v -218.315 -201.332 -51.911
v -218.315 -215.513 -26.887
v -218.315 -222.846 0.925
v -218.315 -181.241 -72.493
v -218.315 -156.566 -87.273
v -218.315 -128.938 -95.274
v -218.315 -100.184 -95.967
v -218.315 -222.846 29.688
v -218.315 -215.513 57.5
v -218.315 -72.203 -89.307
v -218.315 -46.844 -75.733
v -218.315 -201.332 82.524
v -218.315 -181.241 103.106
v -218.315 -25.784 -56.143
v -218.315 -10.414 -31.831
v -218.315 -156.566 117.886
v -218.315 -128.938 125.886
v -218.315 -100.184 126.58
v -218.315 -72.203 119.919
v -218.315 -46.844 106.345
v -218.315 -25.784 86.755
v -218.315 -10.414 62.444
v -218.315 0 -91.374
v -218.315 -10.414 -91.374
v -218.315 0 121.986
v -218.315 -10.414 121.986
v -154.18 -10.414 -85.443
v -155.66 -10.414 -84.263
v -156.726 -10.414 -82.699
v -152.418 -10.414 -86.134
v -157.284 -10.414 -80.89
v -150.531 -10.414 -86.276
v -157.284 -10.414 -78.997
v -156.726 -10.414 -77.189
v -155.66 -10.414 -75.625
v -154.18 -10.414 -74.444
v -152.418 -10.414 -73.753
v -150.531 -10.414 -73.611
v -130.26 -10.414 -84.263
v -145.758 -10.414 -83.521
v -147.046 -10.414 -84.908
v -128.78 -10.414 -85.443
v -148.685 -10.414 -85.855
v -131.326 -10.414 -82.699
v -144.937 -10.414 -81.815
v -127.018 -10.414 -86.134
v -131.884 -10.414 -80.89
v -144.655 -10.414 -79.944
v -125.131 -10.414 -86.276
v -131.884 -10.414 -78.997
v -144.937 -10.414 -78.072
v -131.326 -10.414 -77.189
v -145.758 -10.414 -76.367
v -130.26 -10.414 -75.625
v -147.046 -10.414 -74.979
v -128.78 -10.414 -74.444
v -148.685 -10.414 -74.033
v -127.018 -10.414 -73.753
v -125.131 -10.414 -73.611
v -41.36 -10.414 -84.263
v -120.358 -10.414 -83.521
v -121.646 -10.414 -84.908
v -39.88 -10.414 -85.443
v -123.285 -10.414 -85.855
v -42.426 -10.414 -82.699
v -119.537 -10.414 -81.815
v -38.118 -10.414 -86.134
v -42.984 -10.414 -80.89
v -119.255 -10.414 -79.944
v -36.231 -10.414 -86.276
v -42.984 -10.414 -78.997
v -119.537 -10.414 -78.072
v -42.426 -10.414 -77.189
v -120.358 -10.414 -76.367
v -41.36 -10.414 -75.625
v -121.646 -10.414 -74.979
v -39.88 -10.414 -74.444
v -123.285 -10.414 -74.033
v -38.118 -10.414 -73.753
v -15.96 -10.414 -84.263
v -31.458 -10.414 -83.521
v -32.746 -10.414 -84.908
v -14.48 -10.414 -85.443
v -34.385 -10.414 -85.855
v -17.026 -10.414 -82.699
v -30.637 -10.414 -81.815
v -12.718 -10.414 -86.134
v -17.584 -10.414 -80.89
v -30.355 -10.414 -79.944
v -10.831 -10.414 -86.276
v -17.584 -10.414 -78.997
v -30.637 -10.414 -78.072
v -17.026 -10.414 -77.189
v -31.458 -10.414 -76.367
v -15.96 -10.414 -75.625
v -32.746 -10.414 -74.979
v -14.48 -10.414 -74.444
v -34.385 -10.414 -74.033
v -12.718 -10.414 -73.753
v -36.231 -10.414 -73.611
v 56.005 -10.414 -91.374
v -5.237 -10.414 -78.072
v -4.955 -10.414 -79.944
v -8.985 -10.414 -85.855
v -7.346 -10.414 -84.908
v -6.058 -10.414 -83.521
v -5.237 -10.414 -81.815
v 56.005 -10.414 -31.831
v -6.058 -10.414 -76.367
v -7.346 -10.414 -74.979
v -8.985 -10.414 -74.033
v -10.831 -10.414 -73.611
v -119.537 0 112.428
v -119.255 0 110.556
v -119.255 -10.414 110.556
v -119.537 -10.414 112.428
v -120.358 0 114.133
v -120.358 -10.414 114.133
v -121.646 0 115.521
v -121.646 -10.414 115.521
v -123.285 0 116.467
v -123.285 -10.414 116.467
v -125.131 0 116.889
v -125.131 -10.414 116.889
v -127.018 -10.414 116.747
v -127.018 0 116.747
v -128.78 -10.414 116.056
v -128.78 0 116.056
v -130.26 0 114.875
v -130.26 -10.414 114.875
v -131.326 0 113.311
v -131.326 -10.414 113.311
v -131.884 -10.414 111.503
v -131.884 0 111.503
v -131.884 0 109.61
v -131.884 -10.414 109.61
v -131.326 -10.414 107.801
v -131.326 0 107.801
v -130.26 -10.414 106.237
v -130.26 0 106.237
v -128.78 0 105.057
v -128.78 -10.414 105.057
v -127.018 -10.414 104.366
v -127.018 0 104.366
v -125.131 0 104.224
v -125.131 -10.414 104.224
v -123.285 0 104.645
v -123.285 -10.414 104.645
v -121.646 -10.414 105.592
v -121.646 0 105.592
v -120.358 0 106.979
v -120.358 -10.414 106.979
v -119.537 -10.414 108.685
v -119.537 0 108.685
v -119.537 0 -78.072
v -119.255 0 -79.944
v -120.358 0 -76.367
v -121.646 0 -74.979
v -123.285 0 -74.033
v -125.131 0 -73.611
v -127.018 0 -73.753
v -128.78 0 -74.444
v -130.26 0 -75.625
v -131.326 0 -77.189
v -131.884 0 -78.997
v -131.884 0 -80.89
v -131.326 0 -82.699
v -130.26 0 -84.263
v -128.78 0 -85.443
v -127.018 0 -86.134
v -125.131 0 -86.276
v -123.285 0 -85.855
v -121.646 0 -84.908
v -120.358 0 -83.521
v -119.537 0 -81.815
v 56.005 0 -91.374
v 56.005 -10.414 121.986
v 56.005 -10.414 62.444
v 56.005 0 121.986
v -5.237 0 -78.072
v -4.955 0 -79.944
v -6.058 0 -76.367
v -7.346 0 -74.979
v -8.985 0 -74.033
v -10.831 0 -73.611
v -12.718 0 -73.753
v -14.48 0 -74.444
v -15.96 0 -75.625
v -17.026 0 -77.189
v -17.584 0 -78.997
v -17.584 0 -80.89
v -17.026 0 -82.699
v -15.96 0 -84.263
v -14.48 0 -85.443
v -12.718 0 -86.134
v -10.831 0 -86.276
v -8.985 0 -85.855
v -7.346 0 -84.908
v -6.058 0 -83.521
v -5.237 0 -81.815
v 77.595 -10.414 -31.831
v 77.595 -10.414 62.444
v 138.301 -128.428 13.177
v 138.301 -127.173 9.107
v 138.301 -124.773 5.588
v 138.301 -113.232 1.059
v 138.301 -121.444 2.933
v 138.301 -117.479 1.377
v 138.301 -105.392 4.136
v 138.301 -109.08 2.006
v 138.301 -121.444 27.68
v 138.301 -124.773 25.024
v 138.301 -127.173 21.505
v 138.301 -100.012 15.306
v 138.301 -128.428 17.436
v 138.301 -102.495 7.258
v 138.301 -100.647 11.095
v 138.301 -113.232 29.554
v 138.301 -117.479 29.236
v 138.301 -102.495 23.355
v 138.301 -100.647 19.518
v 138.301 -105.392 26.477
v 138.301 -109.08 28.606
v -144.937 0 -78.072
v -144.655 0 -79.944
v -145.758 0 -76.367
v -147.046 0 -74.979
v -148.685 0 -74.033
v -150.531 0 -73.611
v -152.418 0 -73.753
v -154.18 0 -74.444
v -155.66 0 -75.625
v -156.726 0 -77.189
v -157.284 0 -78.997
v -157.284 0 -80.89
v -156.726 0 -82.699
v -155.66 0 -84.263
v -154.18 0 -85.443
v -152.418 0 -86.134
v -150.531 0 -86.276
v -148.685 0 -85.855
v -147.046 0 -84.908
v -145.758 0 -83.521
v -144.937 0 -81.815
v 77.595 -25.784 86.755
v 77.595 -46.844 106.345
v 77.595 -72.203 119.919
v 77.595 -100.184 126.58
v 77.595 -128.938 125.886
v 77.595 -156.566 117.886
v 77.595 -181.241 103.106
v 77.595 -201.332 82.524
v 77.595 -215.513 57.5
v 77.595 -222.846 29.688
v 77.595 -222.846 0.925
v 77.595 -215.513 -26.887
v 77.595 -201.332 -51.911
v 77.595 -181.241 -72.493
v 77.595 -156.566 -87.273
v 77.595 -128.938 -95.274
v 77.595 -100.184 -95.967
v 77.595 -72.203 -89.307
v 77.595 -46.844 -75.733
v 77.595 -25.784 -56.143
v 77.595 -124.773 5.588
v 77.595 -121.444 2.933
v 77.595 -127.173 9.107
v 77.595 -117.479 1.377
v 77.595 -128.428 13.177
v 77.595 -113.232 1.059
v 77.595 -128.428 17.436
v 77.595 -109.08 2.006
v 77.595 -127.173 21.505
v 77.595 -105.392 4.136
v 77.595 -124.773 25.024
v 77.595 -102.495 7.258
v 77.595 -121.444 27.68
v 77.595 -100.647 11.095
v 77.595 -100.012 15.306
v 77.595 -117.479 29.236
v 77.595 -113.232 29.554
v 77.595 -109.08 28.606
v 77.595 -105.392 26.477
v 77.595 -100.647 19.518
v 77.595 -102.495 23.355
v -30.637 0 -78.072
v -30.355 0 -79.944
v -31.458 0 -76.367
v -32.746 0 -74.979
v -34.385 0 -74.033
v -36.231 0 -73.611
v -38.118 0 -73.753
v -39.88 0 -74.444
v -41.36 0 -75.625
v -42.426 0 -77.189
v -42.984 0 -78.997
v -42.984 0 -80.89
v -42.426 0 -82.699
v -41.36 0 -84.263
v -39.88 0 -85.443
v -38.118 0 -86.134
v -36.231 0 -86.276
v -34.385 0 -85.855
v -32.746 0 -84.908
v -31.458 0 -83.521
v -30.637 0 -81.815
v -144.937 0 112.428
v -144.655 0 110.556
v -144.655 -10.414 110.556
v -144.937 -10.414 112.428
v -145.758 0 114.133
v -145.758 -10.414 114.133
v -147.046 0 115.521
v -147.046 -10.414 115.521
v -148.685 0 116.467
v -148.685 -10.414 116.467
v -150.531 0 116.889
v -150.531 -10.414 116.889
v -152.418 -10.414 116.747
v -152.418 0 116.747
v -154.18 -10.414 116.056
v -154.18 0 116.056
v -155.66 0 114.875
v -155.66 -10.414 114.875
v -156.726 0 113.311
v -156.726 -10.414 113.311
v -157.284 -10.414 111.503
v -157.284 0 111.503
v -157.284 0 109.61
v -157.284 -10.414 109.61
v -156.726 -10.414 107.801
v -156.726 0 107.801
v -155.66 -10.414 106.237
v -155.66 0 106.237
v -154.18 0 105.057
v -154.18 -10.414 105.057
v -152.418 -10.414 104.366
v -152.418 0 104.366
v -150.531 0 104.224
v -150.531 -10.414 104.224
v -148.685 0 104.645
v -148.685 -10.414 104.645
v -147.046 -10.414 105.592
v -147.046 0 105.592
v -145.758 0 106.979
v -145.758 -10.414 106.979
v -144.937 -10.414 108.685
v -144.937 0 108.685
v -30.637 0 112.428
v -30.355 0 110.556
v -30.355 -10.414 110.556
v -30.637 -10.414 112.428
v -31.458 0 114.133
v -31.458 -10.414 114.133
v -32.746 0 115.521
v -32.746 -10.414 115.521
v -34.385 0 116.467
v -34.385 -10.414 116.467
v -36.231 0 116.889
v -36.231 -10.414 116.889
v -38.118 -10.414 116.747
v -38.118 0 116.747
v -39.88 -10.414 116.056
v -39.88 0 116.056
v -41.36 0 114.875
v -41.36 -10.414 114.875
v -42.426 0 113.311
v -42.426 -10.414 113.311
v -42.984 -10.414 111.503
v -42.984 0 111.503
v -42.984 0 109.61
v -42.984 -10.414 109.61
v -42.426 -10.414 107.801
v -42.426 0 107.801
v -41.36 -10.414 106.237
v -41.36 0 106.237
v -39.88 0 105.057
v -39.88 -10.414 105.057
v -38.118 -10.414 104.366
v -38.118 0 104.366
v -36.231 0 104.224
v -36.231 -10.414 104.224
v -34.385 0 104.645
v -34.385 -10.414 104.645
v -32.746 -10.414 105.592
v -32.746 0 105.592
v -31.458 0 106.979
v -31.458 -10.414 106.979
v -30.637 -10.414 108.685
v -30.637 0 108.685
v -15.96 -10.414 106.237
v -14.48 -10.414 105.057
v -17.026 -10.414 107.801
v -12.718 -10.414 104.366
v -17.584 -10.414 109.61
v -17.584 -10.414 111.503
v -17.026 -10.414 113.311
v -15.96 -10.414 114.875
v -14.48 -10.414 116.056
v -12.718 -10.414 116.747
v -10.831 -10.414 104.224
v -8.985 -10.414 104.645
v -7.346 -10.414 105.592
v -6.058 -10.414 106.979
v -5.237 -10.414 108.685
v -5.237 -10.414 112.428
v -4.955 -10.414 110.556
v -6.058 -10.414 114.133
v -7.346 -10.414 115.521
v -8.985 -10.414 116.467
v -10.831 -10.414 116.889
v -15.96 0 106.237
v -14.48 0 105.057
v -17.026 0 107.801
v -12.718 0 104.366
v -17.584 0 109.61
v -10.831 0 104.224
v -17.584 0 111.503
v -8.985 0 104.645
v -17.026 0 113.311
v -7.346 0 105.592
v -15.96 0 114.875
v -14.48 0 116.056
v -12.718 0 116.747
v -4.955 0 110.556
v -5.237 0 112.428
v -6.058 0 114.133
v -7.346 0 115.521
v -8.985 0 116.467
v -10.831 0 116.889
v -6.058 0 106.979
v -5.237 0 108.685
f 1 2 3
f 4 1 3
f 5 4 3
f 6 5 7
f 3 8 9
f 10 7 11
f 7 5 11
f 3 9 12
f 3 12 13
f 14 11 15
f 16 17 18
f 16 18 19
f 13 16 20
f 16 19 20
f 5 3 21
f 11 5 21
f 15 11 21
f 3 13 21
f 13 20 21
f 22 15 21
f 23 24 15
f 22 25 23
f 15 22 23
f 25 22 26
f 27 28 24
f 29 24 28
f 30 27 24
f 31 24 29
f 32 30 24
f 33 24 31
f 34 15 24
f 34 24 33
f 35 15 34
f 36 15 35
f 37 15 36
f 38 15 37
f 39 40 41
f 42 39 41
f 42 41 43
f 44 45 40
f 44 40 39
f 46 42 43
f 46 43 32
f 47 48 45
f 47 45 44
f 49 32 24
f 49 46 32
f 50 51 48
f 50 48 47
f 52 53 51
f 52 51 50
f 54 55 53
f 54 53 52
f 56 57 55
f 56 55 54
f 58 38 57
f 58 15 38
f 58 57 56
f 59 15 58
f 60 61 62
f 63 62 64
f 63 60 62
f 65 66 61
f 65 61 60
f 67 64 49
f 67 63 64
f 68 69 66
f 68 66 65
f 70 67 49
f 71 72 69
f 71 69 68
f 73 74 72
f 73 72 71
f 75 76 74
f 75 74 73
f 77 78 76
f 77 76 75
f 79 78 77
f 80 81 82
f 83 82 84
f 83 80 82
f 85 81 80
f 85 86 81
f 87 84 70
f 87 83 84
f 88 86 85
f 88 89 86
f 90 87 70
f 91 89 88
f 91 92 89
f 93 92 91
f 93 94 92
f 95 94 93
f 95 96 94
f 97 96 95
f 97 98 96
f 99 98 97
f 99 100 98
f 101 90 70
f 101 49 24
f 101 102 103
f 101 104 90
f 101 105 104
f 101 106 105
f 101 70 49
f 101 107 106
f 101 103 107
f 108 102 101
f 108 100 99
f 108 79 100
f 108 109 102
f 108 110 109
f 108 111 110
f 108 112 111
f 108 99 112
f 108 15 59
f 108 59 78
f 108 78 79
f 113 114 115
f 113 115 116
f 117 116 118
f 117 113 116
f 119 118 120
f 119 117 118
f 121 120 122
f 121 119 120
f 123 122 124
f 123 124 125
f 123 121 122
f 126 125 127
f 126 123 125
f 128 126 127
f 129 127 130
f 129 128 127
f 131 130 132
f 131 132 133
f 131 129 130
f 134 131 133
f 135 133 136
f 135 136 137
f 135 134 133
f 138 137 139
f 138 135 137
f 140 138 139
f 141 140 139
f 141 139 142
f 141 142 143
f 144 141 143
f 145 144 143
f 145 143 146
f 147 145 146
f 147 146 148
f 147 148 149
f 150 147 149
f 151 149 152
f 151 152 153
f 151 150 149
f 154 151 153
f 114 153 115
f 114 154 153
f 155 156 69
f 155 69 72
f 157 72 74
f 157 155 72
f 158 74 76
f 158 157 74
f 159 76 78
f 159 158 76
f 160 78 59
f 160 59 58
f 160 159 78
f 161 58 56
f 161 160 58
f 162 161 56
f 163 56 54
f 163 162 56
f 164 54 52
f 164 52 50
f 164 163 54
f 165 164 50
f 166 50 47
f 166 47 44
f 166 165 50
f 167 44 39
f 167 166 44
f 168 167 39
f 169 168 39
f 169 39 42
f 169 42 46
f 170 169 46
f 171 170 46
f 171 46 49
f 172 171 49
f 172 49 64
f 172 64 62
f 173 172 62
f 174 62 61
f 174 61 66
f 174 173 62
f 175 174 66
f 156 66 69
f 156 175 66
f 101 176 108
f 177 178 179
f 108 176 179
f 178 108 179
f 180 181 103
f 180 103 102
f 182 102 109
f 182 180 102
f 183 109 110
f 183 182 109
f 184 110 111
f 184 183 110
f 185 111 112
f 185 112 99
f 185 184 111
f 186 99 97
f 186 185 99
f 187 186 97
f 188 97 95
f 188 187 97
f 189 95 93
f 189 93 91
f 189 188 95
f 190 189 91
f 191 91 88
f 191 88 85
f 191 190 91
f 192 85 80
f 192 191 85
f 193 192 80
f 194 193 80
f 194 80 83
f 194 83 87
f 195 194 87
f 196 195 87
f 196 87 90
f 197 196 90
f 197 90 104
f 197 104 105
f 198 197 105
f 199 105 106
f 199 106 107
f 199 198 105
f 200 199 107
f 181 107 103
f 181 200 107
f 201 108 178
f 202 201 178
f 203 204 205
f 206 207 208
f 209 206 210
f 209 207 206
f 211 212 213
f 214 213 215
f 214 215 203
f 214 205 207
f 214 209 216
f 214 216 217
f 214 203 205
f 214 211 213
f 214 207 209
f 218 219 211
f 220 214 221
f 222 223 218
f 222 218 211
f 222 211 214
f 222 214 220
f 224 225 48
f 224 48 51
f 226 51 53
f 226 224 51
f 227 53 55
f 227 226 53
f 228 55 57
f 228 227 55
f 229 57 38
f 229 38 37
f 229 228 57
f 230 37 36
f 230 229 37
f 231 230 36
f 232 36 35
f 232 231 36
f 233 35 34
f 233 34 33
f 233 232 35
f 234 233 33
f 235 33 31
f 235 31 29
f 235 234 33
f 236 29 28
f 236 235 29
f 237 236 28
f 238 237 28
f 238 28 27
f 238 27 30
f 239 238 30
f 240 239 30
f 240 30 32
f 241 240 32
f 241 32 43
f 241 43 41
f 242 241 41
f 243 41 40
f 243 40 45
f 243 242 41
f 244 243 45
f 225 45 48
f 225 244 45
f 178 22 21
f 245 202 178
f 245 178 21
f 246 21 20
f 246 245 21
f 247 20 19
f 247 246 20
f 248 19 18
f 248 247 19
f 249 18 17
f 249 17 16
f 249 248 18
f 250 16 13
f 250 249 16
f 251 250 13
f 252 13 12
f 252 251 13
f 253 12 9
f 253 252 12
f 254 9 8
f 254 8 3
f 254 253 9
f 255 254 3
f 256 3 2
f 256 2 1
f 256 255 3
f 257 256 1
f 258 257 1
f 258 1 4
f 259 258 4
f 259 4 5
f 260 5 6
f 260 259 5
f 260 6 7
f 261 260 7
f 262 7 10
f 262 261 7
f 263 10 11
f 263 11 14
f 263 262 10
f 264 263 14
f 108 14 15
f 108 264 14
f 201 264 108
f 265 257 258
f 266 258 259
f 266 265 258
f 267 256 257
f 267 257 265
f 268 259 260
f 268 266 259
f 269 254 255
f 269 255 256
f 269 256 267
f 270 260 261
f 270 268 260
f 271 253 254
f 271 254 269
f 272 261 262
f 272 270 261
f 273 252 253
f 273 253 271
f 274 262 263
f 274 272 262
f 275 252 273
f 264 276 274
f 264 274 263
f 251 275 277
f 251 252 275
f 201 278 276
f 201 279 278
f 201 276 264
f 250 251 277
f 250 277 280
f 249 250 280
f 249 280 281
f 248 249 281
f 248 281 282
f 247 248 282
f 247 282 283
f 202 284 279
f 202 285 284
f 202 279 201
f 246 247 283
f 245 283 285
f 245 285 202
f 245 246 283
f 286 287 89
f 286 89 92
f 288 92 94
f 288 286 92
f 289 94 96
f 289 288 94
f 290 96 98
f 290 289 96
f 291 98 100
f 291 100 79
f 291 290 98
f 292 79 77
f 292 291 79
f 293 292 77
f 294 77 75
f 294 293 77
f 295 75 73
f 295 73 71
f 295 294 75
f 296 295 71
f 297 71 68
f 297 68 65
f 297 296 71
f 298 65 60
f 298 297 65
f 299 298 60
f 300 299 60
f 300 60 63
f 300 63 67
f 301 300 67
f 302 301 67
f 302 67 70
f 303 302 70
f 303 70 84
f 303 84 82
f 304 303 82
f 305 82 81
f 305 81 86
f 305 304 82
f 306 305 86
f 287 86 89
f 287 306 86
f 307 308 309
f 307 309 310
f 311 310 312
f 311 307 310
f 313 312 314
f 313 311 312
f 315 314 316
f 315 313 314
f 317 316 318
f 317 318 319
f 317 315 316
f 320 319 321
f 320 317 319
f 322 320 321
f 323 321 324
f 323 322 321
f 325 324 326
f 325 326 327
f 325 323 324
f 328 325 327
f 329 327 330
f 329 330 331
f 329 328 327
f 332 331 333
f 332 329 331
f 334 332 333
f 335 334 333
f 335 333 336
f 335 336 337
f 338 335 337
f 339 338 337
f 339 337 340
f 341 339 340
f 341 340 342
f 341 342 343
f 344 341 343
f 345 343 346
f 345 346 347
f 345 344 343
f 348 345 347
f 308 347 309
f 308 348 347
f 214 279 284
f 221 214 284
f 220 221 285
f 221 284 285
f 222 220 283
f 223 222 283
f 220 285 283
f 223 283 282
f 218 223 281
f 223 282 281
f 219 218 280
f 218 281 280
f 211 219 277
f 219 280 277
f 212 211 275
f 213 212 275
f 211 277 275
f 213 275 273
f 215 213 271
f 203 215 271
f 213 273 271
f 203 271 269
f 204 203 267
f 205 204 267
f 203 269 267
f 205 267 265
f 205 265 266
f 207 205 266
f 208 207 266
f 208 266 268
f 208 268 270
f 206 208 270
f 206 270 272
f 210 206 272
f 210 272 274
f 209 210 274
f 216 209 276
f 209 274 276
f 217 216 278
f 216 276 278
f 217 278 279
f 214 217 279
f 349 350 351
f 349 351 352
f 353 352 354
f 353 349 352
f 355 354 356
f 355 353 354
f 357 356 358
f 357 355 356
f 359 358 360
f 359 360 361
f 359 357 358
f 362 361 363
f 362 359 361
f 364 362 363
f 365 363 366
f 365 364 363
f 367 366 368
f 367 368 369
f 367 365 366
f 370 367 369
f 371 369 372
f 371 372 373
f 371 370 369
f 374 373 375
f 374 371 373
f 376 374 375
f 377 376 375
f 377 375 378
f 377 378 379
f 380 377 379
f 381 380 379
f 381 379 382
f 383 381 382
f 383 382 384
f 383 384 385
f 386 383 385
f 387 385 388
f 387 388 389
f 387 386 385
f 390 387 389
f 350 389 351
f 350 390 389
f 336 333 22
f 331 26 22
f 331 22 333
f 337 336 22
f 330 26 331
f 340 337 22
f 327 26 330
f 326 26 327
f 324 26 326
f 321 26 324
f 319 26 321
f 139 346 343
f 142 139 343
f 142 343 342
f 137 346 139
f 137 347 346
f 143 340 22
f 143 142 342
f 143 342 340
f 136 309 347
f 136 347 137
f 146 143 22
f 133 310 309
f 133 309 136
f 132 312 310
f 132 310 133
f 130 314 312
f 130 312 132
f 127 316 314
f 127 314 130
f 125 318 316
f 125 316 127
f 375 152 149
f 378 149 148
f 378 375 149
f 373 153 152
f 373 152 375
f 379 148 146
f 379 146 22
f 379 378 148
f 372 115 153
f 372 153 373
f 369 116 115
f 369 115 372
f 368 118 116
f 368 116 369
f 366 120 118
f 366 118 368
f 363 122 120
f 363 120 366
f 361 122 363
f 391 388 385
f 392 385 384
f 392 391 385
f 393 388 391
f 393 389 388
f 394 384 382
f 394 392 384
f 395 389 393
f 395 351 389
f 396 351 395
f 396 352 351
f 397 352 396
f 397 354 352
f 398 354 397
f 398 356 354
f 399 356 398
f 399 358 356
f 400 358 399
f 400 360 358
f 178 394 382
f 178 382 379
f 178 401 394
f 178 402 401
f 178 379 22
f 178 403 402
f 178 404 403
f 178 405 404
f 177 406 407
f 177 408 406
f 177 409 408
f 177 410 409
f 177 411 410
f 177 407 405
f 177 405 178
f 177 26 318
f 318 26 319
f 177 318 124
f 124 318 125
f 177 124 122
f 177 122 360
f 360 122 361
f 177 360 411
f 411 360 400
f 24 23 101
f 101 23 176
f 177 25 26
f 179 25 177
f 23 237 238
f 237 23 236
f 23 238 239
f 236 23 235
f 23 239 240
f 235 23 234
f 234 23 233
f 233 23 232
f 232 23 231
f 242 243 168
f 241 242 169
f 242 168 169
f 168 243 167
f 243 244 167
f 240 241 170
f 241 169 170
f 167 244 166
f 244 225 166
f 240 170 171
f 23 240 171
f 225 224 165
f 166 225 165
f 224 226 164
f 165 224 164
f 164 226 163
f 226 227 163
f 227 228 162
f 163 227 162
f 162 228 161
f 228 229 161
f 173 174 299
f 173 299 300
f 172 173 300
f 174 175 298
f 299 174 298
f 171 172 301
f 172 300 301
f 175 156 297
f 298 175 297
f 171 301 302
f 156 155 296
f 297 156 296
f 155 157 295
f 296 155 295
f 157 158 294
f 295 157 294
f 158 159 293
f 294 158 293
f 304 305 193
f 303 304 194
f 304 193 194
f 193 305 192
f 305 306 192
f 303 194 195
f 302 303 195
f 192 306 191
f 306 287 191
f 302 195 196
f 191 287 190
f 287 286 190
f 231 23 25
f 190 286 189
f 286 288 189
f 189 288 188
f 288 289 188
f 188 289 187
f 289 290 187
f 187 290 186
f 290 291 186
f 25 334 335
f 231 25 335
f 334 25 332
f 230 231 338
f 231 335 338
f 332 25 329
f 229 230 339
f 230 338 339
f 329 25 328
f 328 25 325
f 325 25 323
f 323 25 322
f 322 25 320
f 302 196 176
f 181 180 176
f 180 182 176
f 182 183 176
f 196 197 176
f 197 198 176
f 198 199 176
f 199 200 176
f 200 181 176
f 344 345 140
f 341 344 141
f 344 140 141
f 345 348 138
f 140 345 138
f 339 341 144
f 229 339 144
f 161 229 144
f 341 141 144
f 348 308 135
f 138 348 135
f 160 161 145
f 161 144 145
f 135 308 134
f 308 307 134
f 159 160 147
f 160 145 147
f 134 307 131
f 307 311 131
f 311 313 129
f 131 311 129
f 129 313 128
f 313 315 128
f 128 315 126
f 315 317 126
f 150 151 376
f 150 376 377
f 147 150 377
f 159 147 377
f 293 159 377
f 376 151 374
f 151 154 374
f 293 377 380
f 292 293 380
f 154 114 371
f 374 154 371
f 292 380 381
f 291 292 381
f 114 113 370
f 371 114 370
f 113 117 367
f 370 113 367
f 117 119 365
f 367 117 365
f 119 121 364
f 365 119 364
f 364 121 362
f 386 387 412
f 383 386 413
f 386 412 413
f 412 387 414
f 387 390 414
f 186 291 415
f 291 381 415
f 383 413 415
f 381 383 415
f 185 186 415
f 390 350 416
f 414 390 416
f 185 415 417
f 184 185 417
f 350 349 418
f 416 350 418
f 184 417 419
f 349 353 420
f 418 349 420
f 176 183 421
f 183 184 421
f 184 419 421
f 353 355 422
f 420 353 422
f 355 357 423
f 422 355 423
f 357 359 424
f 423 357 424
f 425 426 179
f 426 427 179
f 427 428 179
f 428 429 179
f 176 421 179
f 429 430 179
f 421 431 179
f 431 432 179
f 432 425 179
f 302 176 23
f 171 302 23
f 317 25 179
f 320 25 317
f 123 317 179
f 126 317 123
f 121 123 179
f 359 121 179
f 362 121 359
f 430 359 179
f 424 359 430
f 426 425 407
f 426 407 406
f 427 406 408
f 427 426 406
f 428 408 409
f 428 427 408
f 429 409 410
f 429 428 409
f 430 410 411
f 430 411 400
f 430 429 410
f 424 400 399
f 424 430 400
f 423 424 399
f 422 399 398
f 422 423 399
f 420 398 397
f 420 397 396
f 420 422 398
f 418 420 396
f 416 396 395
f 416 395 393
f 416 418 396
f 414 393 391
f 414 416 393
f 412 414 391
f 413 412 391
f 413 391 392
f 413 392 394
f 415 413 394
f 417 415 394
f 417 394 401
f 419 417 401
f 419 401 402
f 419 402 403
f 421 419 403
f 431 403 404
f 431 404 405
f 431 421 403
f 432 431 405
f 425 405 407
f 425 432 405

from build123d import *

# Parameters (mm, degrees)
F0_W          = 274.32
F0_H          = 213.36
F0_R          = 6.35
F1_DEPTH      = 10.414
F3_DEPTH      = 21.59
F3_DEPTH_BACK = 274.32
F4_R          = 14.2875
F5_DEPTH      = 60.706


with BuildPart() as f1:
    # F0 (on Front) → F1 (new body)
    with BuildSketch(Plane.XZ):
        with Locations((-81.1550752527, 15.3063097969)):
            Rectangle(F0_W, F0_H)
        with Locations((-151.0050752527, -79.9436902031)):
            Circle(F0_R, mode=Mode.SUBTRACT)
        with Locations((-125.6050752527, -79.9436902031)):
            Circle(F0_R, mode=Mode.SUBTRACT)
        with Locations((-36.7050752527, -79.9436902031)):
            Circle(F0_R, mode=Mode.SUBTRACT)
        with Locations((-11.3050752527, -79.9436902031)):
            Circle(F0_R, mode=Mode.SUBTRACT)
        with Locations((-151.0050752527, 110.5563097969)):
            Circle(F0_R, mode=Mode.SUBTRACT)
        with Locations((-125.6050752527, 110.5563097969)):
            Circle(F0_R, mode=Mode.SUBTRACT)
        with Locations((-36.7050752527, 110.5563097969)):
            Circle(F0_R, mode=Mode.SUBTRACT)
        with Locations((-11.3050752527, 110.5563097969)):
            Circle(F0_R, mode=Mode.SUBTRACT)
    extrude(amount=F1_DEPTH)

    # F2 (on face) → F3 (join, two sides)
    with BuildSketch(Plane.YZ.offset(56.0049247473)) as f3_sk:
        with BuildLine():
            Line((-10.414, -31.8310537272), (-10.414, 62.4436733209))
            ThreePointArc((-10.414, 62.4436733209), (-223.774, 15.3063097969), (-10.414, -31.8310537272))
        make_face()
    extrude(amount=F3_DEPTH)
    extrude(f3_sk.sketch, amount=-F3_DEPTH_BACK)

    # F4 (on face) → F5 (join)
    with BuildSketch(Plane.YZ.offset(77.5949247473)):
        with Locations((-114.3, 15.3063097969)):
            Circle(F4_R)
    extrude(amount=F5_DEPTH)


solid = f1.part
